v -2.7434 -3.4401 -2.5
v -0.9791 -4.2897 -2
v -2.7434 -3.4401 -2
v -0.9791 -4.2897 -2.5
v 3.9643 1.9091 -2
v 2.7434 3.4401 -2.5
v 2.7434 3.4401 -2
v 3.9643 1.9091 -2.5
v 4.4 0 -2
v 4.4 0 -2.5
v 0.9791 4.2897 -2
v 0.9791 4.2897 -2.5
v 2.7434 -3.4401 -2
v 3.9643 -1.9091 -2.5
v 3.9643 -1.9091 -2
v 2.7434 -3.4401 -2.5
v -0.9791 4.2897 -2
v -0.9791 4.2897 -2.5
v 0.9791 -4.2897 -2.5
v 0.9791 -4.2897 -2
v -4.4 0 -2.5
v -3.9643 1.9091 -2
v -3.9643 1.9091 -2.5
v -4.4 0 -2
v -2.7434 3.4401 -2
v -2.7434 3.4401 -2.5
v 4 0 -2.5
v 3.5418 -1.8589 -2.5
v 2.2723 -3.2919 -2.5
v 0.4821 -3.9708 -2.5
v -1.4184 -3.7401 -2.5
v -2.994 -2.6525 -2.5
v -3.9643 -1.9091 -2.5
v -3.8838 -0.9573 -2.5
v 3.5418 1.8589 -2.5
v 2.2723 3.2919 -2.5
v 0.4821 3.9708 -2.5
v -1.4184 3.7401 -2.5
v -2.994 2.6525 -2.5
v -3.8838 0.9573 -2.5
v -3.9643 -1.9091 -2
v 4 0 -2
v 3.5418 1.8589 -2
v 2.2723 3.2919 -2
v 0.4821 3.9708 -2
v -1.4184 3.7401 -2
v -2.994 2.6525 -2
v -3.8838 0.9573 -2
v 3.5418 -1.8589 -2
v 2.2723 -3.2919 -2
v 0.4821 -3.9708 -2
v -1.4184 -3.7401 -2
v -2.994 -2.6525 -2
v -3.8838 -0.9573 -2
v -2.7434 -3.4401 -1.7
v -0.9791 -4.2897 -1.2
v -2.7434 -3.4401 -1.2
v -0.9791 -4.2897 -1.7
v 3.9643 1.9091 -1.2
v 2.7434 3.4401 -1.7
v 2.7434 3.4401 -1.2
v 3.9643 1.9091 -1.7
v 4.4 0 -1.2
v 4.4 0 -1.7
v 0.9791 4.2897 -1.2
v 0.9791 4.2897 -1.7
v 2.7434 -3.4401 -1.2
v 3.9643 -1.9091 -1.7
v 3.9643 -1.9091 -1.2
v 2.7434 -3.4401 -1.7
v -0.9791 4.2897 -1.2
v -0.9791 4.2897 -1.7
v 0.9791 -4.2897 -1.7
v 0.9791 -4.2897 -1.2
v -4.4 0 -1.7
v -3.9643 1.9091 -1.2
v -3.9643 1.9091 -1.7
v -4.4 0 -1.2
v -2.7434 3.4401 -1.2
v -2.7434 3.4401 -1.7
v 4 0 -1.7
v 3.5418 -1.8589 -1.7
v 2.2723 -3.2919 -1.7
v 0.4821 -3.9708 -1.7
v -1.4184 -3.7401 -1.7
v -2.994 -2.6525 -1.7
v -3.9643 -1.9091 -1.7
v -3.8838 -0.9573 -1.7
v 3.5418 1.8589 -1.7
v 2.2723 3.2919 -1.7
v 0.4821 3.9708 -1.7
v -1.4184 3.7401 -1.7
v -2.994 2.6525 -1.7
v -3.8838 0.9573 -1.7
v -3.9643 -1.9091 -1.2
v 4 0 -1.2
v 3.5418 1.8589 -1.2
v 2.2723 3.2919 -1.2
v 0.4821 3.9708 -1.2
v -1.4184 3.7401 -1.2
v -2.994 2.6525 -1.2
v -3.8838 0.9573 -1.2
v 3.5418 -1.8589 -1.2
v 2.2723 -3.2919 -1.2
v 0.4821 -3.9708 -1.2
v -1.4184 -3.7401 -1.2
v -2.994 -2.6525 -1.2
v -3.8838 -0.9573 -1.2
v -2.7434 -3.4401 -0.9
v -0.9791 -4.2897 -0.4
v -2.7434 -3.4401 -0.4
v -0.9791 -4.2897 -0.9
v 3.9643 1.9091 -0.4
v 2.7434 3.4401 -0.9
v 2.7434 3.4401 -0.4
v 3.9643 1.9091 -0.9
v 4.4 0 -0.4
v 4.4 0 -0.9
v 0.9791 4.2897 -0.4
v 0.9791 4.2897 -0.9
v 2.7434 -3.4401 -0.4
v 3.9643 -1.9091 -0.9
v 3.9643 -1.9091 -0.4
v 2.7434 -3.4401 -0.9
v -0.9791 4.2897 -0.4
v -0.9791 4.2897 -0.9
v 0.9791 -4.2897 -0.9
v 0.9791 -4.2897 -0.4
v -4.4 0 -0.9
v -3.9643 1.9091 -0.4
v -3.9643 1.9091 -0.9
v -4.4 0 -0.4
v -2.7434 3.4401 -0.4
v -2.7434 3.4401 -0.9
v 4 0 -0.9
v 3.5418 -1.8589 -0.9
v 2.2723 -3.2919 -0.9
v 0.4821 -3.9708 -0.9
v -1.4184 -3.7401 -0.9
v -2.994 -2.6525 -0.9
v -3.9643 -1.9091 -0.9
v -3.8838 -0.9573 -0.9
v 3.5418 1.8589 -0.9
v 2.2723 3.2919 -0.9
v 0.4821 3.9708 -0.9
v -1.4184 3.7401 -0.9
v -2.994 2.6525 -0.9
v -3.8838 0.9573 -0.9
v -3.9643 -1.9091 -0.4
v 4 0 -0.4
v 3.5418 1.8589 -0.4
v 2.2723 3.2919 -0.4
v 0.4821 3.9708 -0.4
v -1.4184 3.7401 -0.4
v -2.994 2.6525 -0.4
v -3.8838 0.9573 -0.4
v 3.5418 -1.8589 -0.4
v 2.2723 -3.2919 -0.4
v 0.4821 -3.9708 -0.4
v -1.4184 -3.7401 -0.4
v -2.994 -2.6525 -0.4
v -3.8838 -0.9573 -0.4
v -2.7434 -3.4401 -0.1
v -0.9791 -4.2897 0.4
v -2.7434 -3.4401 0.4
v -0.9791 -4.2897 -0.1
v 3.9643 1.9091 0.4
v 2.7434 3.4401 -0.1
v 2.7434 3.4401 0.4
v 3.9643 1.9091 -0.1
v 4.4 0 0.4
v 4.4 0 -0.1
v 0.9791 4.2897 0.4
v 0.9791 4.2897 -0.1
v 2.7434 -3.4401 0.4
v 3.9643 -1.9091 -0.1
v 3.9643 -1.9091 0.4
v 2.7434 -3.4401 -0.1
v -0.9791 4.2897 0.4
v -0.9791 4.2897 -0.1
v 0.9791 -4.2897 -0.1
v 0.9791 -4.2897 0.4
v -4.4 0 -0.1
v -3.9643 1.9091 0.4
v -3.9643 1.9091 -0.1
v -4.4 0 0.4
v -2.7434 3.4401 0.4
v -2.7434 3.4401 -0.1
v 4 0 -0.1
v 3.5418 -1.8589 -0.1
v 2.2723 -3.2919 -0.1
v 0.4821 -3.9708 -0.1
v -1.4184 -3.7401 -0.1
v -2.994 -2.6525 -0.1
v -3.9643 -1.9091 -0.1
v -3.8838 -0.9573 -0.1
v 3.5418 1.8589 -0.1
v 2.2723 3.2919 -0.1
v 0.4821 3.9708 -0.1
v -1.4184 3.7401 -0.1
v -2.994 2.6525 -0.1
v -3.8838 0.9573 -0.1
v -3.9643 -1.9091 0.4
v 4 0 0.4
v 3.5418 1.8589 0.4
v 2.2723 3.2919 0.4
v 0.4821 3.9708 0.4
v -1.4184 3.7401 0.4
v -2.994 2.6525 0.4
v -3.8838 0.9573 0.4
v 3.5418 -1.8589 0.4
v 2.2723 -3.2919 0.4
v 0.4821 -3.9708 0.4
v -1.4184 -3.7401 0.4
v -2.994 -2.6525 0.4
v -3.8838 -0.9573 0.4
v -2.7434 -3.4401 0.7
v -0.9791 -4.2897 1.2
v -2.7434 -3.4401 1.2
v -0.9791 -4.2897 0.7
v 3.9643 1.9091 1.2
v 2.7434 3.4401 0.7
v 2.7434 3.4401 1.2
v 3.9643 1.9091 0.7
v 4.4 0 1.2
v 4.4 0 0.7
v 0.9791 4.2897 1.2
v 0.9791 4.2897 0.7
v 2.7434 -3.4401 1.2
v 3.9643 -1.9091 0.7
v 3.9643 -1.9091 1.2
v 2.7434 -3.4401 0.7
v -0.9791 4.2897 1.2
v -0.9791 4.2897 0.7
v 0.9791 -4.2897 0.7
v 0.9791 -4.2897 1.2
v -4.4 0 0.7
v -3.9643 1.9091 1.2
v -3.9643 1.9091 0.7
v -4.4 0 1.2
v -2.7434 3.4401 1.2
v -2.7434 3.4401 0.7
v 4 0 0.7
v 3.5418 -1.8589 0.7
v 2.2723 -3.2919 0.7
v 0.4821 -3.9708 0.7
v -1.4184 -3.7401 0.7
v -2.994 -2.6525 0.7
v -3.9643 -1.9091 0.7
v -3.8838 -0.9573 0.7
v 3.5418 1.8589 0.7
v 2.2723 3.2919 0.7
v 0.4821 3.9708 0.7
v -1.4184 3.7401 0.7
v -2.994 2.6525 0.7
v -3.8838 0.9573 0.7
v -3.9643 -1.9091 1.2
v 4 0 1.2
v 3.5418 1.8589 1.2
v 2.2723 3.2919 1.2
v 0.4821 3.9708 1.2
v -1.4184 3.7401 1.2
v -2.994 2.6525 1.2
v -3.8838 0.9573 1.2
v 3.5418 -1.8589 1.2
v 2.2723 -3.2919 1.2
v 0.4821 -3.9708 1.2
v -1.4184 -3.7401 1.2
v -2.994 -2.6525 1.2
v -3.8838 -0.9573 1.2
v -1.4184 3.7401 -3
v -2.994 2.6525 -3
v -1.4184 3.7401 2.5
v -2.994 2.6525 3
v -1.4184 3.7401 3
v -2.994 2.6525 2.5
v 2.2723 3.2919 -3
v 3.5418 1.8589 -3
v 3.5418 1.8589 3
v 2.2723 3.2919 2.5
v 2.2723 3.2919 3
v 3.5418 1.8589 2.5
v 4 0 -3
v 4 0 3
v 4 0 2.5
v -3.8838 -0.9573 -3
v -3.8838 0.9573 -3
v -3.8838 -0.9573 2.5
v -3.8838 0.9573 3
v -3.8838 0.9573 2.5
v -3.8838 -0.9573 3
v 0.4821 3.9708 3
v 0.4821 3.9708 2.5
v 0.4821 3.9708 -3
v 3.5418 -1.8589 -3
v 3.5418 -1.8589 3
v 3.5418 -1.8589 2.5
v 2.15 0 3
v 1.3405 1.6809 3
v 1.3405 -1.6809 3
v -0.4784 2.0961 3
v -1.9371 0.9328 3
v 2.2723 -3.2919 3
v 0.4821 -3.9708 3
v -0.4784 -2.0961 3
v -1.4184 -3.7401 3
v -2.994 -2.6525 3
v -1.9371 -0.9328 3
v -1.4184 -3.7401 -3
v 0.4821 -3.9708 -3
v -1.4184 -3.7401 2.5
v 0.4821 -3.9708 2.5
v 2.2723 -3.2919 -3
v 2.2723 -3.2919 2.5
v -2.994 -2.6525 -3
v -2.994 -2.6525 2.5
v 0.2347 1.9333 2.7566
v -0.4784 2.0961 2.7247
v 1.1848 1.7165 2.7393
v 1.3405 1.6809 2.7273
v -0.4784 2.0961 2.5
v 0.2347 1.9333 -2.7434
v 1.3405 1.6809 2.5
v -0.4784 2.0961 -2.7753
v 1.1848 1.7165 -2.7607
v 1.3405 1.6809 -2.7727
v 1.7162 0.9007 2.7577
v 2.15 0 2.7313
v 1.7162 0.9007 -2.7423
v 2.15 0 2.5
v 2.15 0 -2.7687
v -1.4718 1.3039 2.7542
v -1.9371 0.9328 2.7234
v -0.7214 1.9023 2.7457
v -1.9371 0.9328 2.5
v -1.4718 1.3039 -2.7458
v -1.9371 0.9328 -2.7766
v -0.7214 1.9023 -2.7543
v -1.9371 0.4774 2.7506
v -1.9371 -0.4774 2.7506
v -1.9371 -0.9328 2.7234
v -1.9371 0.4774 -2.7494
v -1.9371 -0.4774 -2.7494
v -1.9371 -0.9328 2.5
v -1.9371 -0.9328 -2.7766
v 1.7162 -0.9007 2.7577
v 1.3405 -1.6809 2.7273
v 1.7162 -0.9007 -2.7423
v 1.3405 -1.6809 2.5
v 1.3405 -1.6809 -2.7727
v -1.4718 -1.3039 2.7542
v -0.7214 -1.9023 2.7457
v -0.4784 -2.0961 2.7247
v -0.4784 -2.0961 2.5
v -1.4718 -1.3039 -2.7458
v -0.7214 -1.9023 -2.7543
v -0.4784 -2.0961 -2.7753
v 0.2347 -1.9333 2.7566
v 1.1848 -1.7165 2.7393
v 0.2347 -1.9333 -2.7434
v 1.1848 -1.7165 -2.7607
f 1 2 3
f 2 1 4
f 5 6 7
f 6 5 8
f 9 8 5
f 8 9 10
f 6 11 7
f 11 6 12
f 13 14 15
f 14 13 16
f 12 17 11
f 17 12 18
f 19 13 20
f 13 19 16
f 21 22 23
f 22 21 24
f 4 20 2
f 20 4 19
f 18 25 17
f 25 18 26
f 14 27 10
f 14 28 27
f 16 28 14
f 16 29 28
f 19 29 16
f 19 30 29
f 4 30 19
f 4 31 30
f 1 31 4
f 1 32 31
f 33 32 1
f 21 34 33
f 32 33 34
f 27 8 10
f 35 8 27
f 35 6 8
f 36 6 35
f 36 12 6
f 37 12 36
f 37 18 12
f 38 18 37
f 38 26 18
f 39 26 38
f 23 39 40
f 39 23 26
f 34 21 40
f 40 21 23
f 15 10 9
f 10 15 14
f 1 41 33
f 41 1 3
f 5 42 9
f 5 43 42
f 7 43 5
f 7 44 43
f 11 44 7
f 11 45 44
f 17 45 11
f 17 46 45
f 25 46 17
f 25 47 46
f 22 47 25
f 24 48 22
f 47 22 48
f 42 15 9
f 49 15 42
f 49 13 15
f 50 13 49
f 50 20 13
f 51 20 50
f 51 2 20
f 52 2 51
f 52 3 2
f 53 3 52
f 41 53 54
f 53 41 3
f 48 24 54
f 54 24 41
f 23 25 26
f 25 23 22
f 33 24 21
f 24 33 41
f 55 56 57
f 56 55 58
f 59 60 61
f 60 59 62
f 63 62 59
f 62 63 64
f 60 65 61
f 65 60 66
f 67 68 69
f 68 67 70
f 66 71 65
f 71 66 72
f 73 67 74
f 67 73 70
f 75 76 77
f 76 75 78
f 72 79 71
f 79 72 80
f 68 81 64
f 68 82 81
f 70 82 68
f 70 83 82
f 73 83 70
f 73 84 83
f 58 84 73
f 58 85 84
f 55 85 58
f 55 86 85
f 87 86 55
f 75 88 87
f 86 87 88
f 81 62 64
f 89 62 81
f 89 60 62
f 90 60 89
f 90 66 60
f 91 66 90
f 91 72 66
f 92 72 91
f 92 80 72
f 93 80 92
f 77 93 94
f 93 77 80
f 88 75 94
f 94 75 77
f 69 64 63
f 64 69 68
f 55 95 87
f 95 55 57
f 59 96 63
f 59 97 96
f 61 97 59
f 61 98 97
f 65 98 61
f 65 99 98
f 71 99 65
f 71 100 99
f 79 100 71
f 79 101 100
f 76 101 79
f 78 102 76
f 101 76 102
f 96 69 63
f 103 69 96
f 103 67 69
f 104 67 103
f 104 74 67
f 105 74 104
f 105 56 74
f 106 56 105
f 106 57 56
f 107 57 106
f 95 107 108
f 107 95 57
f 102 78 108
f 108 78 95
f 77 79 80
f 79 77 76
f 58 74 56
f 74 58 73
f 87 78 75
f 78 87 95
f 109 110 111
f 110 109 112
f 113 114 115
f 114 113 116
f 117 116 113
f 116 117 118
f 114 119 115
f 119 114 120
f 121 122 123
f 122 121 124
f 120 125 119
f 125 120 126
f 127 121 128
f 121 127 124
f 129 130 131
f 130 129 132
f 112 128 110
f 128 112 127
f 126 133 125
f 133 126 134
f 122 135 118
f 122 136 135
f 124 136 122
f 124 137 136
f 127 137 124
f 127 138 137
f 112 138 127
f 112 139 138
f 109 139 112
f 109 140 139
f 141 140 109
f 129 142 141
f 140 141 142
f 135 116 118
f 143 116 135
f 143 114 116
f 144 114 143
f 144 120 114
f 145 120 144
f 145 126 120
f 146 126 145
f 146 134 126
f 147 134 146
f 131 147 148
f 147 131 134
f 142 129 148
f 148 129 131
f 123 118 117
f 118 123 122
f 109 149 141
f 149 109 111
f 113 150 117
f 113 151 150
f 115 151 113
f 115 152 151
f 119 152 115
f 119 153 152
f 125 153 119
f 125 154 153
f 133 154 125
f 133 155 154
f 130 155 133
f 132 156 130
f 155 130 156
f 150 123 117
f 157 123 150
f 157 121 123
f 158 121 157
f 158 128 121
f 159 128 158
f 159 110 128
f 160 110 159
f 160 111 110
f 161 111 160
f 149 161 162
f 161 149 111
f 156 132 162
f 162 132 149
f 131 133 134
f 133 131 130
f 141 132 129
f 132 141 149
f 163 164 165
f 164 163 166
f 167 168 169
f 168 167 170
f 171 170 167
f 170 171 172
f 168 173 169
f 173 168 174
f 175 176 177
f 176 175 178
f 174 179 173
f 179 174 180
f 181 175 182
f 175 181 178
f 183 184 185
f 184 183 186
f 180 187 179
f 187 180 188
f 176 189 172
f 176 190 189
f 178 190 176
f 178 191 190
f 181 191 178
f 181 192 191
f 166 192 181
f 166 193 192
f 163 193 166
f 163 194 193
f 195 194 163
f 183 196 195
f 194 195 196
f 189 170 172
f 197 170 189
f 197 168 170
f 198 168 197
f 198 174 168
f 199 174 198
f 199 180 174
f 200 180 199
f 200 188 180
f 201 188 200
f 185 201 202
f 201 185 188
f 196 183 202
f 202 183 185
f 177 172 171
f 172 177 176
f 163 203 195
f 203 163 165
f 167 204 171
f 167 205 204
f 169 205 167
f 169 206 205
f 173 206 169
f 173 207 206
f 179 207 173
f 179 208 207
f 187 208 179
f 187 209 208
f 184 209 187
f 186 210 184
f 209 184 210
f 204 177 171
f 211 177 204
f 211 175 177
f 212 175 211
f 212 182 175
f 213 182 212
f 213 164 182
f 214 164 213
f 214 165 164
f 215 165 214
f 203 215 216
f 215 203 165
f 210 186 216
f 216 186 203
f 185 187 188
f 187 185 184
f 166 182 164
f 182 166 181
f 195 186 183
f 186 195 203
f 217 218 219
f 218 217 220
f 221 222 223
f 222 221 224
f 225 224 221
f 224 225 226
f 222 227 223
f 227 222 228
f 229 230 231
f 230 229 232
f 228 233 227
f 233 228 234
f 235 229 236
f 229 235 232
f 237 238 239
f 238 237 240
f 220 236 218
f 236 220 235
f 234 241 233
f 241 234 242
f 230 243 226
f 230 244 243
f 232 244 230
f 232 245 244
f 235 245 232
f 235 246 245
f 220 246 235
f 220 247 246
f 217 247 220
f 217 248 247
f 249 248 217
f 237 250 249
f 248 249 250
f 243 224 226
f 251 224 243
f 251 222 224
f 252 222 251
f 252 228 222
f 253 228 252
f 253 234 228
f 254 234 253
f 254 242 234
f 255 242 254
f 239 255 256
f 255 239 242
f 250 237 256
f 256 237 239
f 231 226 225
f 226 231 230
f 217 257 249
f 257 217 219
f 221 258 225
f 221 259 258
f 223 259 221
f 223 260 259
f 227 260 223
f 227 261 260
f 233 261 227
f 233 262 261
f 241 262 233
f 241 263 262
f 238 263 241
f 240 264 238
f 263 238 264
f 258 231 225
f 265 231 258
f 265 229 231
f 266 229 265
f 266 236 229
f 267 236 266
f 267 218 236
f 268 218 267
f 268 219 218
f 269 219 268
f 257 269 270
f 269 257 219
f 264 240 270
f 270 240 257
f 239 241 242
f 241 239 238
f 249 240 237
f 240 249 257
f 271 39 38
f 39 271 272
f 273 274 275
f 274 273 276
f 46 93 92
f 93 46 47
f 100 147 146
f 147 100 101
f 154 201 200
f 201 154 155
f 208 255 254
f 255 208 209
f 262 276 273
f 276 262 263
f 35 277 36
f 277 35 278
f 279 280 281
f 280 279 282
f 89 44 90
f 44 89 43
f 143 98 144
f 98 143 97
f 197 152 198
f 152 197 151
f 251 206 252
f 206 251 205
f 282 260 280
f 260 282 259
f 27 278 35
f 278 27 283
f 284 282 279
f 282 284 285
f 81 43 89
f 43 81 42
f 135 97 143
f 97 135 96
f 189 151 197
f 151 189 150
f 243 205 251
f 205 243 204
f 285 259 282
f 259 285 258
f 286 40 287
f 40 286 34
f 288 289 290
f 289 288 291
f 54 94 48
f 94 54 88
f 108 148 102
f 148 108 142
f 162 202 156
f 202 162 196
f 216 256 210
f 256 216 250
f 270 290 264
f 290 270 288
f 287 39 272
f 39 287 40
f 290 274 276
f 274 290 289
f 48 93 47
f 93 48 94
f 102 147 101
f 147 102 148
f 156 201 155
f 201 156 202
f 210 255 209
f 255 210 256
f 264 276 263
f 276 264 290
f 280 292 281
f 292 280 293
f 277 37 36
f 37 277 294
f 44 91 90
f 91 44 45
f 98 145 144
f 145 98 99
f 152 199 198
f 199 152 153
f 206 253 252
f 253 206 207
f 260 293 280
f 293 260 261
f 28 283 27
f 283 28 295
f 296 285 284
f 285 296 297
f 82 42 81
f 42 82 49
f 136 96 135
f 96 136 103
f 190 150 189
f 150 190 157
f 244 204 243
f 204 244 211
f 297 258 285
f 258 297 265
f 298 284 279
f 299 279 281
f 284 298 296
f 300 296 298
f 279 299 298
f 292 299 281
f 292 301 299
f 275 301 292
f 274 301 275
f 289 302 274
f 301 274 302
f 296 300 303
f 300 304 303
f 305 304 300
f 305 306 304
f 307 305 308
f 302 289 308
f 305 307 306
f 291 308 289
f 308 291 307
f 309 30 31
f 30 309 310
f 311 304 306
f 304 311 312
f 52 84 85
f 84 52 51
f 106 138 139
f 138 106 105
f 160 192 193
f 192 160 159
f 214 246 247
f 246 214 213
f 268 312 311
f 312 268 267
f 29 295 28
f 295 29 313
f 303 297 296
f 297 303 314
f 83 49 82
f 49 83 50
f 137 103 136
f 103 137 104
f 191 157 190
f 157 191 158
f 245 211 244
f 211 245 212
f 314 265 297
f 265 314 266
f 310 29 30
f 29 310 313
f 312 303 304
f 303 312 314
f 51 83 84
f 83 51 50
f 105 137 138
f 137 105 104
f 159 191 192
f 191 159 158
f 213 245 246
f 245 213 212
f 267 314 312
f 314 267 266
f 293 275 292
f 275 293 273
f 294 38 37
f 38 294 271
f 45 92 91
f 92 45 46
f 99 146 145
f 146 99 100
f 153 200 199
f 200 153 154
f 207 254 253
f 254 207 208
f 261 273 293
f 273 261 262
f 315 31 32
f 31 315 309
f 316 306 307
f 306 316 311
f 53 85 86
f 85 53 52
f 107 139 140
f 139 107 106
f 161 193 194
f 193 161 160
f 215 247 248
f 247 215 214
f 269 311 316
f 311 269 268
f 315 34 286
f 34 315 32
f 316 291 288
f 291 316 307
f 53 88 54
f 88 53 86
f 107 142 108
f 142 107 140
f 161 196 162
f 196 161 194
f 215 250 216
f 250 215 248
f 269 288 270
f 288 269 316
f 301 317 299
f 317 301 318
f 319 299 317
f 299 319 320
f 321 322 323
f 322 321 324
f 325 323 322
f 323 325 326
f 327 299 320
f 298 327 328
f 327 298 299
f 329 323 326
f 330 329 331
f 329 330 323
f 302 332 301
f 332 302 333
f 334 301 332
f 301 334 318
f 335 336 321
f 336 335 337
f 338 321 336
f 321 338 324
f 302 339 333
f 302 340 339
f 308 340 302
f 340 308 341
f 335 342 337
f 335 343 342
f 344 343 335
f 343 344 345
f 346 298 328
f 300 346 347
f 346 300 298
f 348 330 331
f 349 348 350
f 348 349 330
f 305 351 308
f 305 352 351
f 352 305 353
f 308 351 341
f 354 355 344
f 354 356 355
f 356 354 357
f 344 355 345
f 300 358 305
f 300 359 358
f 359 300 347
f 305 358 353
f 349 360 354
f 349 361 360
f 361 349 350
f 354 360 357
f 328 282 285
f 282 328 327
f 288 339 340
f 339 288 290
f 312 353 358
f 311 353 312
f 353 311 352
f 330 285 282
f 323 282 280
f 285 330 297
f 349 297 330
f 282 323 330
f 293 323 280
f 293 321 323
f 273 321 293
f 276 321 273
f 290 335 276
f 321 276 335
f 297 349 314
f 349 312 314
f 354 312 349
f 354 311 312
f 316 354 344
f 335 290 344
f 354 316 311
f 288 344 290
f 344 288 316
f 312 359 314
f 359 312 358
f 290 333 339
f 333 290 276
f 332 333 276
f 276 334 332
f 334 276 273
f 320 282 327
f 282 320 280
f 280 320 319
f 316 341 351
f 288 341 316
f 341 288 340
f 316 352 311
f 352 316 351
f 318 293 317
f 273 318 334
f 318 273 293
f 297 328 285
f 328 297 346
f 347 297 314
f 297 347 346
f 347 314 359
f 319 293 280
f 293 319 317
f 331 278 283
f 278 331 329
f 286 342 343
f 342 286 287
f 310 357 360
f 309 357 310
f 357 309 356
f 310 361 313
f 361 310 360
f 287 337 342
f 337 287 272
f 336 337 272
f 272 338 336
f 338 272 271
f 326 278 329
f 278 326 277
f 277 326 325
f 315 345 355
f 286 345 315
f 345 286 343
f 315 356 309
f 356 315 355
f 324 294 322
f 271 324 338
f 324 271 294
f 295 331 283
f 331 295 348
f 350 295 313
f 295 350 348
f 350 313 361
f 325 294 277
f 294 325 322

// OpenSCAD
// Parameters
outer_diameter_mm = 8.0; //[4.0:16.0:0.1]
length_mm = 6.0; //[3.0:12.0:0.1]
screw_nominal_diameter_mm = 3.0; //[2.0:6.0:0.1]
internal_thread_pitch_mm = 0.5; //[0.35:1.0:0.01]
pilot_hole_diameter_mm = 4.2; //[3.0:6.0:0.05]
knurl_depth_mm = 0.4; //[0.2:1.0:0.05]
knurl_pitch_mm = 0.8; //[0.4:1.6:0.05]
end_chamfer_mm = 0.5; //[0.2:1.5:0.05]
lead_in_chamfer_mm = 0.5; //[0.2:1.5:0.05]
tolerance_mm = 0.1; //[0.0:0.3:0.01]
bore_through = 1; //[0:1:1]
overlap_mm = 0.8; //[0.5:2.0:0.1]
knurl_ring_height_mm = 0.5; //[0.3:1.2:0.05]
knurl_ring_count = 5; //[2:12:1]

// Threaded Insert - complete geometry
module threaded_insert() {
  color([0.8, 0.6, 0.2]) { // Brass color
    difference() {
      union() {
        // Main body
        cylinder(h=length_mm, r=outer_diameter_mm/2, center=true);
        
        // External knurl/barbs
        for (i = [0:knurl_ring_count-1]) {
          translate([0, 0, -length_mm/2 + lead_in_chamfer_mm + knurl_ring_height_mm/2 + i*knurl_pitch_mm])
            cylinder(h=knurl_ring_height_mm, r=outer_diameter_mm/2 + knurl_depth_mm, center=true);
        }
      }
      
      // Internal bore
      cylinder(h=length_mm + 2*overlap_mm, r=(pilot_hole_diameter_mm + tolerance_mm)/2, center=true);
      
      // Lead-in chamfer
      translate([0, 0, length_mm/2 - lead_in_chamfer_mm/2])
        cylinder(h=lead_in_chamfer_mm, r1=outer_diameter_mm/2, r2=0, center=true);
      
      // Installation end chamfer
      translate([0, 0, -length_mm/2 + end_chamfer_mm/2])
        cylinder(h=end_chamfer_mm, r1=outer_diameter_mm/2, r2=0, center=true);
    }
  }
}

// Assembly
module assembly() {
  threaded_insert();
}

assembly();
